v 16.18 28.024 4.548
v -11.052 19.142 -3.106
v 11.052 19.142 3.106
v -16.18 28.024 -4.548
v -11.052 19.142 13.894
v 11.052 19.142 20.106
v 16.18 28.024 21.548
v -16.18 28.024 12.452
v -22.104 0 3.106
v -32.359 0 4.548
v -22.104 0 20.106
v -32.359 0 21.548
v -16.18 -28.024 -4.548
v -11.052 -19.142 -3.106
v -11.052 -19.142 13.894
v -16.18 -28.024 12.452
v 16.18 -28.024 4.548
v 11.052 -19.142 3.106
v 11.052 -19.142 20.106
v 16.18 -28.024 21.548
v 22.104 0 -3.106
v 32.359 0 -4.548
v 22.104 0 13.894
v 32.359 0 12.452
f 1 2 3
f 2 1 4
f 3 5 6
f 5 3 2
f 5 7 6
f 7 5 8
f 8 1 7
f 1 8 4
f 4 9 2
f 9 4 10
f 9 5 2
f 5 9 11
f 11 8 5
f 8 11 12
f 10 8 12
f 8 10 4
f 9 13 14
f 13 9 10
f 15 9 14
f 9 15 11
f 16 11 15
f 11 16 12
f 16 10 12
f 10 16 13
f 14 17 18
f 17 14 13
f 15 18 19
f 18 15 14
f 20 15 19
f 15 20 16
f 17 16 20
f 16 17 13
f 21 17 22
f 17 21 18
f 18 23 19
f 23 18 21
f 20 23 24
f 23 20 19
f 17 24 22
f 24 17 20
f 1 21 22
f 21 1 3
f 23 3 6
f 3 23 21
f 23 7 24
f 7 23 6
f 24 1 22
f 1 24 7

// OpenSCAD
$fs = $preview ? 10 : 1;
sides = 6;

// should include slop!
h_soap = 15;
// should include slop!
d_soap = 40;
twt=1.29;
floor_thickness = 2;
foot_height = 8;

h_magnet = 54.4/30 + .2;
w_magnet = 20.17/4 + .5;
l_magnet = 38.17/2 + .2;


wall_thickness = 2*twt+h_magnet;

wobble = 8;
hole_spacing = (d_soap + floor_thickness+.01) / 3;
hole_percent = 75;
/*
# travel soap container
draining epoxy-coated travel soap bar container

## constraints
I want to make something to hold my travel soap bars with the following constraints
1. waterproof - sealed with epoxy resin
2. draining
3. compact
4. sealed completely when closed
5. doesn't drain on top of eachother
6. needs to hold 3 pucks: soap, shampoo, conditioner

## ideation
* so one design could be like stacking cups with two diameters, holes on the bottom and a lid on top.
    * the bottommost one needs an extra lid for transport
* what if there was a shaft that the holders swung out from?
* what if I got some tins -> no draining
* what if it was held together with magnets? then I wouldn't have to worry about expoxy affecting clearances

## final design
five parts: a top lid, three chambers and a bottom lid. hexagons, just for funsies

##for version 2
the chambers could have three sloping feet that nest with the chamber below. one traingle wave
*/
/*
* the problem is making it seal e. the geometry of the top must mate with the geometry of the bottom
* even though both have a coat of epoxy of an unknown thickness! this is not trivial...
    * a ball and socket is not possible
    * two planes does work
    * a cone works
    * a corner to a corner works
    * not sure about saddles
* the problem can be formalied as follows: find two surfaces embedded in 3d space such that when either surface is
       explanded in the local normal direction they can still mate
 */

/*
I did this on paper, but the mesh is built like a tube, with points arranged "spiraling" along it's "length".
since the pattern of points is periodic, generating the faces is "easy" as 1234,2345,3456...
the tube loops back on itself, so the final faces are 7891,8912,9123
 */
/*
none of this really matters since I already decided that the corners will touch the ground at two points
Edit: this is impossible i think
for a loop of edges to be a polygon, they must all lie in the same plane
for a quadrilateral, two opposite are skew iff the other pair of opposite edges are skew.

* option 1:/ interpolate the saddles, sweeping opposite edges, creating a saddle
    * might interfere with fit
* option 2:) attempt to exploit/discover remaining degrees of freedom so that it's all neat polygons
    * :( foot could touch ground at an angle
    * :( walls could have uneven thickness wait no that doesn't matter
    * :'D tilt troughs up and peaks down. point both to the same point on the z axis
* option 3:( make every saddle concave
* option 4:( match concave and convex saddles
*/
//distance from center
r_0 = d_soap / 2 * (1 / cos(180 / sides)) * (1 / cos(wobble));
r_1 = (d_soap / 2 + wall_thickness) * (1 / cos(180 / sides)) * (1 / cos(wobble));
h_0 = 0;
h_1 = h_soap + floor_thickness;


//r, theta, phi
function sph2cart(rtp) = [rtp.x * sin(rtp.y) * cos(rtp.z), rtp.x * sin(rtp.y) * sin(rtp.z), rtp.x * cos(rtp.y)];

module magnets() {
    //magnets need to be rotated about a derived angle
    //right triangle from top of sloped surface to midpoint of sloped surface to xy intersection
    radius = 1; //to corner
    horizontal_apothem = radius * cos(180 / sides); //to face
    side = radius * sin(180 / sides) * 2;
    dh = radius * tan(wobble);
    tilt = atan2(dh, side / 2);
    for (i = [1:sides]) {
        theta = (i + .5) * 360 / sides;
        direction = 2 * (i % 2) - 1;
        rotate([tilt * - direction, 0, theta])
            translate([(d_soap + wall_thickness) / 2, 0, 0])
                cube([h_magnet, l_magnet, w_magnet * 2], center = true);
    }

    //todo magnets stick out a little
}

module walls() {
    proto_points = [[r_0, h_0], [r_0, h_1], [r_1, h_1], [r_1, h_0]];
    function sector(idx, wobble) = [for (pp = proto_points) (sph2cart([pp[0], wobble, idx * 360 / sides]) + [0, 0, pp[1]
        ])];

    //points = [for (i=[1:sides]) each sector(i, 90-wobble*(2*(i%2)-1))];
    sectors = [for (i = [1:sides]) sector(i, 90 - wobble * (2 * (i % 2) - 1))];
    points = [for (i = [0:len(sectors) - 1], j = [0:len(sectors[0]) - 1]) sectors[i][j]];
    //TESTING// for(point=points)translate(point) cube(center=true);

    proto_faces = [[0, 4, 7, 3], [1, 5, 4, 0], [2, 6, 5, 1], [3, 7, 6, 2]];
    //faces = [for(i=[0:sides-1]) each [for (pf=proto_faces) [for(j=pf) (j+i*4)%len(points)]]];
    face_groups = [for (i = [0:sides - 1]) [for (pf = proto_faces) [for (j = pf) (j + i * 4) % len(points)]]];
    faces = [for (i = [0:len(face_groups) - 1], j = [0:len(face_groups[0]) - 1]) face_groups[i][j]];
    polyhedron(points = points, faces = faces, convexity = 20);
}

module support_blocker(){
    proto_points = [[r_0-1, h_0], [r_0-1, h_1], [r_1+4, h_1], [r_1+4, h_0]];
    function sector(idx, wobble) = [for (pp = proto_points) (sph2cart([pp[0], wobble, idx * 360 / sides]) + [0, 0, pp[1]
        ])];

    //points = [for (i=[1:sides]) each sector(i, 90-wobble*(2*(i%2)-1))];
    sectors = [for (i = [1:sides]) sector(i, 90 - wobble * (2 * (i % 2) - 1))];
    points = [for (i = [0:len(sectors) - 1], j = [0:len(sectors[0]) - 1]) sectors[i][j]];
    //TESTING// for(point=points)translate(point) cube(center=true);

    proto_faces = [[0, 4, 7, 3], [1, 5, 4, 0], [2, 6, 5, 1], [3, 7, 6, 2]];
    //faces = [for(i=[0:sides-1]) each [for (pf=proto_faces) [for(j=pf) (j+i*4)%len(points)]]];
    face_groups = [for (i = [0:sides - 1]) [for (pf = proto_faces) [for (j = pf) (j + i * 4) % len(points)]]];
    faces = [for (i = [0:len(face_groups) - 1], j = [0:len(face_groups[0]) - 1]) face_groups[i][j]];
		
    polyhedron(points = points, faces = faces, convexity = 20);
}


module chamber() {
    translate([0, 0, - r_0 * sin(wobble) - floor_thickness]) difference() {
        walls();
        #magnets();
        translate([0, 0, h_1]) #magnets();
    }

    //floor
    translate([0, 0, - floor_thickness]) difference() {
        cylinder(d = d_soap * (1 / cos(180 / sides)), h = floor_thickness, $fn = sides);
        for (i = [- 5:5], j = [- 5:5])
        rotate([0, 0, 30])
            translate([hole_spacing * i, 0, 0])
                rotate([0, 0, 60])
                    translate([j * hole_spacing, 0, - .01])
                        rotate([0, 0, 30])
                            cylinder(d = (hole_spacing - floor_thickness) / cos(30), h = floor_thickness + .02, $fn = 6);
    }
}


module lid() {
    difference() {
        translate([0, 0, - r_0 * sin(wobble) - floor_thickness]) walls();
        cylinder(r = r_1 * 11, h = h_1 * 11, $fn = 4);
    }
    translate([0, 0, - floor_thickness])
        cylinder(d = d_soap * (1 / cos(180 / sides)), h = floor_thickness, $fn = sides);
}


//chamber();
//translate([0, 0, h_1 + 10]) lid();
support_blocker();
%cylinder(h = h_soap, d = d_soap, $fn = 24);
